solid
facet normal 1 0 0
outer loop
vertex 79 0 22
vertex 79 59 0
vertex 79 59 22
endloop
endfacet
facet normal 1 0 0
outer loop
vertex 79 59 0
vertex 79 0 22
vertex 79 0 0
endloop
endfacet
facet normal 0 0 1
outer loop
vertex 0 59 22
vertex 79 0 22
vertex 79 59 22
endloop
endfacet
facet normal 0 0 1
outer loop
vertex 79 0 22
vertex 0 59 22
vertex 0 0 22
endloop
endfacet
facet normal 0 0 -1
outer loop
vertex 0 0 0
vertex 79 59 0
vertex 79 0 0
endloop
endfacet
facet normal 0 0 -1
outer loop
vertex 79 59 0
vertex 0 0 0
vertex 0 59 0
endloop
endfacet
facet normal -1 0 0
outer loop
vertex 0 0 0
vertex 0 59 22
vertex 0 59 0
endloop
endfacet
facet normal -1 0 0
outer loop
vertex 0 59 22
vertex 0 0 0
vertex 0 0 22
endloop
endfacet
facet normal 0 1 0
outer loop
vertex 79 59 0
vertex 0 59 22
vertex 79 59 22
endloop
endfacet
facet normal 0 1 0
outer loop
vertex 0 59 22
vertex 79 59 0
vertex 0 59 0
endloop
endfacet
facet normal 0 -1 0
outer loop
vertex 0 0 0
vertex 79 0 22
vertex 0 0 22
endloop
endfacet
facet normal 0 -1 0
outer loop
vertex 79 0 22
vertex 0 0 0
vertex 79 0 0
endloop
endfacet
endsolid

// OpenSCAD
// file: config.scad
// --- Robot Dimensions ---
track_width = 50;        // mm
sprocket_diameter = 50;  // mm
motor_length = 54;       // mm
motor_shaft = 6;         // D-shaft diameter
motor_mount_hole = 3;    // M3
battery_length = 75;     // mm
battery_width  = 55;     // mm
battery_height = 20;     // mm
jetson_plate_length = 120; // mm
jetson_plate_width  = 100; // mm
chassis_thickness = 5;      // mm
// main file
include <config.scad>;

module battery_tray() {
    margin = 2;
    cube([battery_length + margin*2,
          battery_width + margin*2,
          battery_height + margin]);

    // Cutout for sliding in batteries
    translate([margin, margin, 0])
        cube([battery_length, battery_width, battery_height]);
}

battery_tray();
